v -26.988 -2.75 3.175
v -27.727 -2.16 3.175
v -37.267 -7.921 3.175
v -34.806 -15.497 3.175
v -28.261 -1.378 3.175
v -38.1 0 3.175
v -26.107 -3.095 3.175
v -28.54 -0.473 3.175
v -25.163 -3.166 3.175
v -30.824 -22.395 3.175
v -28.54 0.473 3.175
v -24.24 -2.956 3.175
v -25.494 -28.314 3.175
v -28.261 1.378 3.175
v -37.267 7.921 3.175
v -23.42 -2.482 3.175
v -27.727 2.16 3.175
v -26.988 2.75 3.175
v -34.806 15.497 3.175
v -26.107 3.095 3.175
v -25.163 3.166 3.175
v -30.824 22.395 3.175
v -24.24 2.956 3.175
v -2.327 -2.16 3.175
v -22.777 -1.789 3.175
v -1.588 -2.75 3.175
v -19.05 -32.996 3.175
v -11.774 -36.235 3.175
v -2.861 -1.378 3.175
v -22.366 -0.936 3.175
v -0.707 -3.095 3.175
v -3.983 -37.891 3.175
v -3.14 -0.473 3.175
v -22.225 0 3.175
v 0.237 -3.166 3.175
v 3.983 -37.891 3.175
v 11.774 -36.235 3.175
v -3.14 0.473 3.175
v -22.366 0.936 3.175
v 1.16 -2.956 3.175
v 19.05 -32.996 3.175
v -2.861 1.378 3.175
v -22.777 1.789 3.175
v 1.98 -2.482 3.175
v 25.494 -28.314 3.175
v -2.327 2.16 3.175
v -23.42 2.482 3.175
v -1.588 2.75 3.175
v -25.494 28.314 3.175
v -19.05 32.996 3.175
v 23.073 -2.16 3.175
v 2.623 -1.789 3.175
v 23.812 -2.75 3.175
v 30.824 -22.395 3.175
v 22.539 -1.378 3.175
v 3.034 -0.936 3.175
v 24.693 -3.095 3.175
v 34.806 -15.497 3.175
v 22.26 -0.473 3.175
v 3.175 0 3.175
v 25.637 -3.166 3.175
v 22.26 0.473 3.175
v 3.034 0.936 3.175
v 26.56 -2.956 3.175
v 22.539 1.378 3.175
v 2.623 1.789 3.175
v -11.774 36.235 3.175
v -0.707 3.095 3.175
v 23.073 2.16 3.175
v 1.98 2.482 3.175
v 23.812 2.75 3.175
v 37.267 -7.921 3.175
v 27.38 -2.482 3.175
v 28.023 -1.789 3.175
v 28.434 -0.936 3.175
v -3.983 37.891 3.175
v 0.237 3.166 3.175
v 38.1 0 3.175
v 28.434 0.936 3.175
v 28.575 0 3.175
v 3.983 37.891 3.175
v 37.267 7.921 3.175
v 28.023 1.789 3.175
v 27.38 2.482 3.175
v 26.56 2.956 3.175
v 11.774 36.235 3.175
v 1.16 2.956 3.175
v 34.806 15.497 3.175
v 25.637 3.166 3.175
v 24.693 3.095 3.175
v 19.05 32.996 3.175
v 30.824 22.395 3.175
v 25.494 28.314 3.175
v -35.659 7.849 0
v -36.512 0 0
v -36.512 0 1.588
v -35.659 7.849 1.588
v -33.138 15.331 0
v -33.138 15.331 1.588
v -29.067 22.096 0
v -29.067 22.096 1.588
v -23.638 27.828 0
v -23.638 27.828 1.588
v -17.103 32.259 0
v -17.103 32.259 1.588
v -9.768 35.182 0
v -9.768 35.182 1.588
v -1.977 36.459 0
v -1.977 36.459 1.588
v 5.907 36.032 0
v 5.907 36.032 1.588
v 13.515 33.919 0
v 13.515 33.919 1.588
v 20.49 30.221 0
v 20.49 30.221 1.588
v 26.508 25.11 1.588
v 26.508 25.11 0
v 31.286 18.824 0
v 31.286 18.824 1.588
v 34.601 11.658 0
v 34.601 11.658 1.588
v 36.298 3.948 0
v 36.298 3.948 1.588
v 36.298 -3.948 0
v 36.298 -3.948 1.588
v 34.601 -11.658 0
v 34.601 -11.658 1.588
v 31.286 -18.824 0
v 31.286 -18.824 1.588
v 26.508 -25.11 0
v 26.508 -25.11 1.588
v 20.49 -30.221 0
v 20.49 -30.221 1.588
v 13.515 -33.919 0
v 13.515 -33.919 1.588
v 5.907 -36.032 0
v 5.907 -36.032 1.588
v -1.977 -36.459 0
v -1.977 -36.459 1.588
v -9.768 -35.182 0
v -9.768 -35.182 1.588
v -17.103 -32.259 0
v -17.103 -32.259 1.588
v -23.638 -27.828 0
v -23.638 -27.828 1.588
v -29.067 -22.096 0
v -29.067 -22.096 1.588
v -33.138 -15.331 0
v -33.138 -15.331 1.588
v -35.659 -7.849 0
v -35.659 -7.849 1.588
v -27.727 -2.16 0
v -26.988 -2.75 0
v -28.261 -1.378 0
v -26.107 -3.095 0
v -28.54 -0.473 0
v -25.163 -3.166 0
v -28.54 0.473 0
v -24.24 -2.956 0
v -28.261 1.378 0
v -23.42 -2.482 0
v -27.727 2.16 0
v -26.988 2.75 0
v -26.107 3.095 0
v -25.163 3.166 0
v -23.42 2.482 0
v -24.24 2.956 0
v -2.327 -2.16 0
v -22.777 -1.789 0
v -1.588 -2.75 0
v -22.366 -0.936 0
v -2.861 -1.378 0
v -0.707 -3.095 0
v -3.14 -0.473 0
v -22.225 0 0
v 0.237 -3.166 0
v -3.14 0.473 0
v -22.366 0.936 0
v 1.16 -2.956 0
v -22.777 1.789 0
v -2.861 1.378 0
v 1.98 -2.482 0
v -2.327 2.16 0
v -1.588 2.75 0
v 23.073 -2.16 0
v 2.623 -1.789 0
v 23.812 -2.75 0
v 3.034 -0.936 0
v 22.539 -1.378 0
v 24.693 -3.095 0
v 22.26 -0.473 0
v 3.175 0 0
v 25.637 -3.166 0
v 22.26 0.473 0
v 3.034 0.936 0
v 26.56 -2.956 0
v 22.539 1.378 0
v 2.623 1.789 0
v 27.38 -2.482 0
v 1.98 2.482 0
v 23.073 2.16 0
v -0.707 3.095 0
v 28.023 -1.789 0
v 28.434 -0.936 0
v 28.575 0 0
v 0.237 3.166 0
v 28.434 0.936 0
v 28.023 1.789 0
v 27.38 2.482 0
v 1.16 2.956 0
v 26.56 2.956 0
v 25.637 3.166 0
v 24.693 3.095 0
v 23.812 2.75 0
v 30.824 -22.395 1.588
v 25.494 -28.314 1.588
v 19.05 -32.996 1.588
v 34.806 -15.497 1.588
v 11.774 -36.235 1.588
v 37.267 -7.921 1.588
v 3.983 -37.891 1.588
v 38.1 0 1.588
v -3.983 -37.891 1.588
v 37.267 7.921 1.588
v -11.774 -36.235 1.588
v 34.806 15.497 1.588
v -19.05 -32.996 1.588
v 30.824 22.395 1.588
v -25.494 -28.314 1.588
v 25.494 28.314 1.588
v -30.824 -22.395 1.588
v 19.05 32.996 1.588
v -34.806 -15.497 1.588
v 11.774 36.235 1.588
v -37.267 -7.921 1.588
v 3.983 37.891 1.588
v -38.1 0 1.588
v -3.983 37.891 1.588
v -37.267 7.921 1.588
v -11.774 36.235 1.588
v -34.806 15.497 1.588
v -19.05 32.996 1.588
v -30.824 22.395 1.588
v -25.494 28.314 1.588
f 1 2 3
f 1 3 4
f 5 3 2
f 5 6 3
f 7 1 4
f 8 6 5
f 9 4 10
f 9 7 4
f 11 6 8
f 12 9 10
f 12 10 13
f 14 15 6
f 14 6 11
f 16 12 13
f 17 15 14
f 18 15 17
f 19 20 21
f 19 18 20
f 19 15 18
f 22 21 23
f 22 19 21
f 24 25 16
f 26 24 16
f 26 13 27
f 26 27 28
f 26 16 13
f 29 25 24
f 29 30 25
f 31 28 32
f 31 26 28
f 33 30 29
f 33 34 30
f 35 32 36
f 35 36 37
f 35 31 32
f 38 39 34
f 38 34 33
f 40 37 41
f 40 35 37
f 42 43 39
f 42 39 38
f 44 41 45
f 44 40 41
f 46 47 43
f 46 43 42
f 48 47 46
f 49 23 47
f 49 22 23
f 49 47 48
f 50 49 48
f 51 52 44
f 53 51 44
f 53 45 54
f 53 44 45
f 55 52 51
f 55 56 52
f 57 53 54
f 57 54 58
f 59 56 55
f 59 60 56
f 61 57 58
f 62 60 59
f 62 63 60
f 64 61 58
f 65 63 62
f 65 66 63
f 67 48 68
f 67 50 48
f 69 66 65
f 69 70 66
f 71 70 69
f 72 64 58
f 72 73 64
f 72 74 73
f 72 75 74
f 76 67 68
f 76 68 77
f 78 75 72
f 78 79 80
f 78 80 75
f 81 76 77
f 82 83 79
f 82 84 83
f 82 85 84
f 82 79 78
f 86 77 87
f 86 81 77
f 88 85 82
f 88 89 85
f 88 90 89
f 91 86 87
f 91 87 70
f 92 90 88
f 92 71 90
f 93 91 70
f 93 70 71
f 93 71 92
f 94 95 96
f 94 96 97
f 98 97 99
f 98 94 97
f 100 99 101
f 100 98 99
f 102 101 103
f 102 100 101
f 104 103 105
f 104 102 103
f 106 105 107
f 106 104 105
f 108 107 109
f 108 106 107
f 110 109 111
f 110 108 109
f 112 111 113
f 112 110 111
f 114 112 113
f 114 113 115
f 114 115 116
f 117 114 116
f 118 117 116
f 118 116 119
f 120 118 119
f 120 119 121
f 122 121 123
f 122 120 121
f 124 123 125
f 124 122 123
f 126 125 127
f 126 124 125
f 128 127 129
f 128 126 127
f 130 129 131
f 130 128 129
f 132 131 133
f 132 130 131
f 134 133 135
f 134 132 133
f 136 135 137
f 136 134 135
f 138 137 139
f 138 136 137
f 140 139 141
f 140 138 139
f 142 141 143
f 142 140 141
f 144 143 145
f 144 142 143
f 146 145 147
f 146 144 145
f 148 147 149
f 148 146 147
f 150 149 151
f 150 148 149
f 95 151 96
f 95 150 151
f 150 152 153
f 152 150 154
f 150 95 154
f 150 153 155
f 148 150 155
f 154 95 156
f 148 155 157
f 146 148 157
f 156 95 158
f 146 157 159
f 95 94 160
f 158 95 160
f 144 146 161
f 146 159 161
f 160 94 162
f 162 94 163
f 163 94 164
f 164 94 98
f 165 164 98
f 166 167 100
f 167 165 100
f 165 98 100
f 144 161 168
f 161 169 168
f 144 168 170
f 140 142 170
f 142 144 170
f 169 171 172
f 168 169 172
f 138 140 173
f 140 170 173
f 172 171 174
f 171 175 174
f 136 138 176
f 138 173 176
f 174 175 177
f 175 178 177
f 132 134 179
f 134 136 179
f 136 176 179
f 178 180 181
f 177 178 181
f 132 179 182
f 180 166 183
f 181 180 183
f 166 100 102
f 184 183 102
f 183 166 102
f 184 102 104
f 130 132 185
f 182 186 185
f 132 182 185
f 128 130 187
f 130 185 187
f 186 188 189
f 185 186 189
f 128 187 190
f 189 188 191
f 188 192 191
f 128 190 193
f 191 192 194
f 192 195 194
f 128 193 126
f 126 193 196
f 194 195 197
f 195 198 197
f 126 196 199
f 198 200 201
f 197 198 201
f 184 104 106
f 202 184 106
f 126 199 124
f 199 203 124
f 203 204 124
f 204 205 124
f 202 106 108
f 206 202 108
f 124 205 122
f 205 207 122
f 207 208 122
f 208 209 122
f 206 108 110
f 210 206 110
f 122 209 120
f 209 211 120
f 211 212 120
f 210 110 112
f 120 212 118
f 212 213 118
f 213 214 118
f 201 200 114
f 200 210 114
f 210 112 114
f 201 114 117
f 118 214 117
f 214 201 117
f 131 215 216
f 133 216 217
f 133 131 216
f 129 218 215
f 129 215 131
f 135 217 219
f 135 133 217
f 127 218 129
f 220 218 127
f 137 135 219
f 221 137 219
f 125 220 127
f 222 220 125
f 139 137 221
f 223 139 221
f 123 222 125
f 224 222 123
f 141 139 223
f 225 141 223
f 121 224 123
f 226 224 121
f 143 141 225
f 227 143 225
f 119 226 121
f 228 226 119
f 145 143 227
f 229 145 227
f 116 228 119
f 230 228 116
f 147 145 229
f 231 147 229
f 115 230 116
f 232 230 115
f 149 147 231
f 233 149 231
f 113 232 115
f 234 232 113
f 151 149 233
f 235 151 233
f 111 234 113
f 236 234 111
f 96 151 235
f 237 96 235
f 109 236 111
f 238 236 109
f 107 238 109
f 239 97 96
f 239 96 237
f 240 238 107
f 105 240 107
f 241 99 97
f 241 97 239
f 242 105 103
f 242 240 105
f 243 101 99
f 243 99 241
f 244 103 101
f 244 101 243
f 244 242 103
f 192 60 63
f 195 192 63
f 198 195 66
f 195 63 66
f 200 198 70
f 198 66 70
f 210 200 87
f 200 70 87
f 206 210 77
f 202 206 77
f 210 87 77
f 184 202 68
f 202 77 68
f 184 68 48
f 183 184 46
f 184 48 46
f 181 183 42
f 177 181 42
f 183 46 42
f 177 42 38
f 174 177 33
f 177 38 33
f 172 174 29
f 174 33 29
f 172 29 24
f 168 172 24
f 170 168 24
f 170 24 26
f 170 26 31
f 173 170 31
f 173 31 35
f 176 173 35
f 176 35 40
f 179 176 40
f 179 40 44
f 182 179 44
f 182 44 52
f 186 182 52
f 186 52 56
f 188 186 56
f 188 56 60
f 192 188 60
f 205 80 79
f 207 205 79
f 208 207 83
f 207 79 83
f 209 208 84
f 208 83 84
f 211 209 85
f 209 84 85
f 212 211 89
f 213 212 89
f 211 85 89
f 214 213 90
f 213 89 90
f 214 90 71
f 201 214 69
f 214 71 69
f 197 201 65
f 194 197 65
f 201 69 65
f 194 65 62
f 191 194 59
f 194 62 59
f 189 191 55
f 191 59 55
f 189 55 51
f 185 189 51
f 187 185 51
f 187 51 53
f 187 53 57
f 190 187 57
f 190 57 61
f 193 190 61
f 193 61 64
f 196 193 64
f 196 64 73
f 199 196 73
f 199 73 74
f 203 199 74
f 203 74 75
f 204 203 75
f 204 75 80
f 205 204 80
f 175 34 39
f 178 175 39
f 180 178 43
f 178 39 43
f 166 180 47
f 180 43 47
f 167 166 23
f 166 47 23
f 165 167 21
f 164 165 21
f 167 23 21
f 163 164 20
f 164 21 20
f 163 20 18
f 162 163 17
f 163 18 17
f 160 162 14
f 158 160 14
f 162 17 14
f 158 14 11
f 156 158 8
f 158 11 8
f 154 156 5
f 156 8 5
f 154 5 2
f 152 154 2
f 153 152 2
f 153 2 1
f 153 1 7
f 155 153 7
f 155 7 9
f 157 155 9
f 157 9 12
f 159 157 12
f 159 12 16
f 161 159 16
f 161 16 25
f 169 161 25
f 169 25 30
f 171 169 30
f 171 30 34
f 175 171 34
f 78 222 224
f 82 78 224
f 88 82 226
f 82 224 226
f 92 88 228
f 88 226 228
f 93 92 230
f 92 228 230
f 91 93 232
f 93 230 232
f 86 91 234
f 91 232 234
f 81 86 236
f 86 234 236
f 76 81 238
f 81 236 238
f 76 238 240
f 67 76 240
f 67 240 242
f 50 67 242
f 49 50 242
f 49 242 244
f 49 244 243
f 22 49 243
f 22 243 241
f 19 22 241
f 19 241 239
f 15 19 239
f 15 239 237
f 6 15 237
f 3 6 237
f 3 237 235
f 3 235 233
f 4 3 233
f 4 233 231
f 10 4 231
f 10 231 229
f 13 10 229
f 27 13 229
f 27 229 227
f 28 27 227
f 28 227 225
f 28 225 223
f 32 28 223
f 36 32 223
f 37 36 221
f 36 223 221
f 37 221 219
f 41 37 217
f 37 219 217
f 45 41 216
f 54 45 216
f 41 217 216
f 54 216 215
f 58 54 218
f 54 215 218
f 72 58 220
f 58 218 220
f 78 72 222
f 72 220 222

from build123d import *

# Parameters (mm, degrees)
SKETCH1_R           = 38.1
BOSS_EXTRUDE1_DEPTH = 3.175
SKETCH2_R           = 38.1
SKETCH2_R_2         = 36.5125
CUT_EXTRUDE1_DEPTH  = 1.5875
SKETCH3_R           = 3.175
CUT_EXTRUDE2_DEPTH  = 54.975


with BuildPart() as part:
    # Sketch1 → Boss-Extrude1 (new body)
    with BuildSketch(Plane.XY):
        Circle(SKETCH1_R)
    extrude(amount=BOSS_EXTRUDE1_DEPTH)

    # Sketch2 → Cut-Extrude1 (cut)
    with BuildSketch(Plane(origin=(0, 0, 0), x_dir=(-1, 0, 0), z_dir=(0, 0, -1))):
        Circle(SKETCH2_R)
        Circle(SKETCH2_R_2, mode=Mode.SUBTRACT)
    extrude(amount=-CUT_EXTRUDE1_DEPTH, mode=Mode.SUBTRACT)

    # Sketch3 → Cut-Extrude2 (cut, through all)
    with BuildSketch(Plane.XY.offset(3.175)):
        Circle(SKETCH3_R)
        with Locations((25.4, 0)):
            Circle(SKETCH3_R)
        with Locations((-25.4, 0)):
            Circle(SKETCH3_R)
    extrude(amount=-CUT_EXTRUDE2_DEPTH, mode=Mode.SUBTRACT)


solid = part.part
